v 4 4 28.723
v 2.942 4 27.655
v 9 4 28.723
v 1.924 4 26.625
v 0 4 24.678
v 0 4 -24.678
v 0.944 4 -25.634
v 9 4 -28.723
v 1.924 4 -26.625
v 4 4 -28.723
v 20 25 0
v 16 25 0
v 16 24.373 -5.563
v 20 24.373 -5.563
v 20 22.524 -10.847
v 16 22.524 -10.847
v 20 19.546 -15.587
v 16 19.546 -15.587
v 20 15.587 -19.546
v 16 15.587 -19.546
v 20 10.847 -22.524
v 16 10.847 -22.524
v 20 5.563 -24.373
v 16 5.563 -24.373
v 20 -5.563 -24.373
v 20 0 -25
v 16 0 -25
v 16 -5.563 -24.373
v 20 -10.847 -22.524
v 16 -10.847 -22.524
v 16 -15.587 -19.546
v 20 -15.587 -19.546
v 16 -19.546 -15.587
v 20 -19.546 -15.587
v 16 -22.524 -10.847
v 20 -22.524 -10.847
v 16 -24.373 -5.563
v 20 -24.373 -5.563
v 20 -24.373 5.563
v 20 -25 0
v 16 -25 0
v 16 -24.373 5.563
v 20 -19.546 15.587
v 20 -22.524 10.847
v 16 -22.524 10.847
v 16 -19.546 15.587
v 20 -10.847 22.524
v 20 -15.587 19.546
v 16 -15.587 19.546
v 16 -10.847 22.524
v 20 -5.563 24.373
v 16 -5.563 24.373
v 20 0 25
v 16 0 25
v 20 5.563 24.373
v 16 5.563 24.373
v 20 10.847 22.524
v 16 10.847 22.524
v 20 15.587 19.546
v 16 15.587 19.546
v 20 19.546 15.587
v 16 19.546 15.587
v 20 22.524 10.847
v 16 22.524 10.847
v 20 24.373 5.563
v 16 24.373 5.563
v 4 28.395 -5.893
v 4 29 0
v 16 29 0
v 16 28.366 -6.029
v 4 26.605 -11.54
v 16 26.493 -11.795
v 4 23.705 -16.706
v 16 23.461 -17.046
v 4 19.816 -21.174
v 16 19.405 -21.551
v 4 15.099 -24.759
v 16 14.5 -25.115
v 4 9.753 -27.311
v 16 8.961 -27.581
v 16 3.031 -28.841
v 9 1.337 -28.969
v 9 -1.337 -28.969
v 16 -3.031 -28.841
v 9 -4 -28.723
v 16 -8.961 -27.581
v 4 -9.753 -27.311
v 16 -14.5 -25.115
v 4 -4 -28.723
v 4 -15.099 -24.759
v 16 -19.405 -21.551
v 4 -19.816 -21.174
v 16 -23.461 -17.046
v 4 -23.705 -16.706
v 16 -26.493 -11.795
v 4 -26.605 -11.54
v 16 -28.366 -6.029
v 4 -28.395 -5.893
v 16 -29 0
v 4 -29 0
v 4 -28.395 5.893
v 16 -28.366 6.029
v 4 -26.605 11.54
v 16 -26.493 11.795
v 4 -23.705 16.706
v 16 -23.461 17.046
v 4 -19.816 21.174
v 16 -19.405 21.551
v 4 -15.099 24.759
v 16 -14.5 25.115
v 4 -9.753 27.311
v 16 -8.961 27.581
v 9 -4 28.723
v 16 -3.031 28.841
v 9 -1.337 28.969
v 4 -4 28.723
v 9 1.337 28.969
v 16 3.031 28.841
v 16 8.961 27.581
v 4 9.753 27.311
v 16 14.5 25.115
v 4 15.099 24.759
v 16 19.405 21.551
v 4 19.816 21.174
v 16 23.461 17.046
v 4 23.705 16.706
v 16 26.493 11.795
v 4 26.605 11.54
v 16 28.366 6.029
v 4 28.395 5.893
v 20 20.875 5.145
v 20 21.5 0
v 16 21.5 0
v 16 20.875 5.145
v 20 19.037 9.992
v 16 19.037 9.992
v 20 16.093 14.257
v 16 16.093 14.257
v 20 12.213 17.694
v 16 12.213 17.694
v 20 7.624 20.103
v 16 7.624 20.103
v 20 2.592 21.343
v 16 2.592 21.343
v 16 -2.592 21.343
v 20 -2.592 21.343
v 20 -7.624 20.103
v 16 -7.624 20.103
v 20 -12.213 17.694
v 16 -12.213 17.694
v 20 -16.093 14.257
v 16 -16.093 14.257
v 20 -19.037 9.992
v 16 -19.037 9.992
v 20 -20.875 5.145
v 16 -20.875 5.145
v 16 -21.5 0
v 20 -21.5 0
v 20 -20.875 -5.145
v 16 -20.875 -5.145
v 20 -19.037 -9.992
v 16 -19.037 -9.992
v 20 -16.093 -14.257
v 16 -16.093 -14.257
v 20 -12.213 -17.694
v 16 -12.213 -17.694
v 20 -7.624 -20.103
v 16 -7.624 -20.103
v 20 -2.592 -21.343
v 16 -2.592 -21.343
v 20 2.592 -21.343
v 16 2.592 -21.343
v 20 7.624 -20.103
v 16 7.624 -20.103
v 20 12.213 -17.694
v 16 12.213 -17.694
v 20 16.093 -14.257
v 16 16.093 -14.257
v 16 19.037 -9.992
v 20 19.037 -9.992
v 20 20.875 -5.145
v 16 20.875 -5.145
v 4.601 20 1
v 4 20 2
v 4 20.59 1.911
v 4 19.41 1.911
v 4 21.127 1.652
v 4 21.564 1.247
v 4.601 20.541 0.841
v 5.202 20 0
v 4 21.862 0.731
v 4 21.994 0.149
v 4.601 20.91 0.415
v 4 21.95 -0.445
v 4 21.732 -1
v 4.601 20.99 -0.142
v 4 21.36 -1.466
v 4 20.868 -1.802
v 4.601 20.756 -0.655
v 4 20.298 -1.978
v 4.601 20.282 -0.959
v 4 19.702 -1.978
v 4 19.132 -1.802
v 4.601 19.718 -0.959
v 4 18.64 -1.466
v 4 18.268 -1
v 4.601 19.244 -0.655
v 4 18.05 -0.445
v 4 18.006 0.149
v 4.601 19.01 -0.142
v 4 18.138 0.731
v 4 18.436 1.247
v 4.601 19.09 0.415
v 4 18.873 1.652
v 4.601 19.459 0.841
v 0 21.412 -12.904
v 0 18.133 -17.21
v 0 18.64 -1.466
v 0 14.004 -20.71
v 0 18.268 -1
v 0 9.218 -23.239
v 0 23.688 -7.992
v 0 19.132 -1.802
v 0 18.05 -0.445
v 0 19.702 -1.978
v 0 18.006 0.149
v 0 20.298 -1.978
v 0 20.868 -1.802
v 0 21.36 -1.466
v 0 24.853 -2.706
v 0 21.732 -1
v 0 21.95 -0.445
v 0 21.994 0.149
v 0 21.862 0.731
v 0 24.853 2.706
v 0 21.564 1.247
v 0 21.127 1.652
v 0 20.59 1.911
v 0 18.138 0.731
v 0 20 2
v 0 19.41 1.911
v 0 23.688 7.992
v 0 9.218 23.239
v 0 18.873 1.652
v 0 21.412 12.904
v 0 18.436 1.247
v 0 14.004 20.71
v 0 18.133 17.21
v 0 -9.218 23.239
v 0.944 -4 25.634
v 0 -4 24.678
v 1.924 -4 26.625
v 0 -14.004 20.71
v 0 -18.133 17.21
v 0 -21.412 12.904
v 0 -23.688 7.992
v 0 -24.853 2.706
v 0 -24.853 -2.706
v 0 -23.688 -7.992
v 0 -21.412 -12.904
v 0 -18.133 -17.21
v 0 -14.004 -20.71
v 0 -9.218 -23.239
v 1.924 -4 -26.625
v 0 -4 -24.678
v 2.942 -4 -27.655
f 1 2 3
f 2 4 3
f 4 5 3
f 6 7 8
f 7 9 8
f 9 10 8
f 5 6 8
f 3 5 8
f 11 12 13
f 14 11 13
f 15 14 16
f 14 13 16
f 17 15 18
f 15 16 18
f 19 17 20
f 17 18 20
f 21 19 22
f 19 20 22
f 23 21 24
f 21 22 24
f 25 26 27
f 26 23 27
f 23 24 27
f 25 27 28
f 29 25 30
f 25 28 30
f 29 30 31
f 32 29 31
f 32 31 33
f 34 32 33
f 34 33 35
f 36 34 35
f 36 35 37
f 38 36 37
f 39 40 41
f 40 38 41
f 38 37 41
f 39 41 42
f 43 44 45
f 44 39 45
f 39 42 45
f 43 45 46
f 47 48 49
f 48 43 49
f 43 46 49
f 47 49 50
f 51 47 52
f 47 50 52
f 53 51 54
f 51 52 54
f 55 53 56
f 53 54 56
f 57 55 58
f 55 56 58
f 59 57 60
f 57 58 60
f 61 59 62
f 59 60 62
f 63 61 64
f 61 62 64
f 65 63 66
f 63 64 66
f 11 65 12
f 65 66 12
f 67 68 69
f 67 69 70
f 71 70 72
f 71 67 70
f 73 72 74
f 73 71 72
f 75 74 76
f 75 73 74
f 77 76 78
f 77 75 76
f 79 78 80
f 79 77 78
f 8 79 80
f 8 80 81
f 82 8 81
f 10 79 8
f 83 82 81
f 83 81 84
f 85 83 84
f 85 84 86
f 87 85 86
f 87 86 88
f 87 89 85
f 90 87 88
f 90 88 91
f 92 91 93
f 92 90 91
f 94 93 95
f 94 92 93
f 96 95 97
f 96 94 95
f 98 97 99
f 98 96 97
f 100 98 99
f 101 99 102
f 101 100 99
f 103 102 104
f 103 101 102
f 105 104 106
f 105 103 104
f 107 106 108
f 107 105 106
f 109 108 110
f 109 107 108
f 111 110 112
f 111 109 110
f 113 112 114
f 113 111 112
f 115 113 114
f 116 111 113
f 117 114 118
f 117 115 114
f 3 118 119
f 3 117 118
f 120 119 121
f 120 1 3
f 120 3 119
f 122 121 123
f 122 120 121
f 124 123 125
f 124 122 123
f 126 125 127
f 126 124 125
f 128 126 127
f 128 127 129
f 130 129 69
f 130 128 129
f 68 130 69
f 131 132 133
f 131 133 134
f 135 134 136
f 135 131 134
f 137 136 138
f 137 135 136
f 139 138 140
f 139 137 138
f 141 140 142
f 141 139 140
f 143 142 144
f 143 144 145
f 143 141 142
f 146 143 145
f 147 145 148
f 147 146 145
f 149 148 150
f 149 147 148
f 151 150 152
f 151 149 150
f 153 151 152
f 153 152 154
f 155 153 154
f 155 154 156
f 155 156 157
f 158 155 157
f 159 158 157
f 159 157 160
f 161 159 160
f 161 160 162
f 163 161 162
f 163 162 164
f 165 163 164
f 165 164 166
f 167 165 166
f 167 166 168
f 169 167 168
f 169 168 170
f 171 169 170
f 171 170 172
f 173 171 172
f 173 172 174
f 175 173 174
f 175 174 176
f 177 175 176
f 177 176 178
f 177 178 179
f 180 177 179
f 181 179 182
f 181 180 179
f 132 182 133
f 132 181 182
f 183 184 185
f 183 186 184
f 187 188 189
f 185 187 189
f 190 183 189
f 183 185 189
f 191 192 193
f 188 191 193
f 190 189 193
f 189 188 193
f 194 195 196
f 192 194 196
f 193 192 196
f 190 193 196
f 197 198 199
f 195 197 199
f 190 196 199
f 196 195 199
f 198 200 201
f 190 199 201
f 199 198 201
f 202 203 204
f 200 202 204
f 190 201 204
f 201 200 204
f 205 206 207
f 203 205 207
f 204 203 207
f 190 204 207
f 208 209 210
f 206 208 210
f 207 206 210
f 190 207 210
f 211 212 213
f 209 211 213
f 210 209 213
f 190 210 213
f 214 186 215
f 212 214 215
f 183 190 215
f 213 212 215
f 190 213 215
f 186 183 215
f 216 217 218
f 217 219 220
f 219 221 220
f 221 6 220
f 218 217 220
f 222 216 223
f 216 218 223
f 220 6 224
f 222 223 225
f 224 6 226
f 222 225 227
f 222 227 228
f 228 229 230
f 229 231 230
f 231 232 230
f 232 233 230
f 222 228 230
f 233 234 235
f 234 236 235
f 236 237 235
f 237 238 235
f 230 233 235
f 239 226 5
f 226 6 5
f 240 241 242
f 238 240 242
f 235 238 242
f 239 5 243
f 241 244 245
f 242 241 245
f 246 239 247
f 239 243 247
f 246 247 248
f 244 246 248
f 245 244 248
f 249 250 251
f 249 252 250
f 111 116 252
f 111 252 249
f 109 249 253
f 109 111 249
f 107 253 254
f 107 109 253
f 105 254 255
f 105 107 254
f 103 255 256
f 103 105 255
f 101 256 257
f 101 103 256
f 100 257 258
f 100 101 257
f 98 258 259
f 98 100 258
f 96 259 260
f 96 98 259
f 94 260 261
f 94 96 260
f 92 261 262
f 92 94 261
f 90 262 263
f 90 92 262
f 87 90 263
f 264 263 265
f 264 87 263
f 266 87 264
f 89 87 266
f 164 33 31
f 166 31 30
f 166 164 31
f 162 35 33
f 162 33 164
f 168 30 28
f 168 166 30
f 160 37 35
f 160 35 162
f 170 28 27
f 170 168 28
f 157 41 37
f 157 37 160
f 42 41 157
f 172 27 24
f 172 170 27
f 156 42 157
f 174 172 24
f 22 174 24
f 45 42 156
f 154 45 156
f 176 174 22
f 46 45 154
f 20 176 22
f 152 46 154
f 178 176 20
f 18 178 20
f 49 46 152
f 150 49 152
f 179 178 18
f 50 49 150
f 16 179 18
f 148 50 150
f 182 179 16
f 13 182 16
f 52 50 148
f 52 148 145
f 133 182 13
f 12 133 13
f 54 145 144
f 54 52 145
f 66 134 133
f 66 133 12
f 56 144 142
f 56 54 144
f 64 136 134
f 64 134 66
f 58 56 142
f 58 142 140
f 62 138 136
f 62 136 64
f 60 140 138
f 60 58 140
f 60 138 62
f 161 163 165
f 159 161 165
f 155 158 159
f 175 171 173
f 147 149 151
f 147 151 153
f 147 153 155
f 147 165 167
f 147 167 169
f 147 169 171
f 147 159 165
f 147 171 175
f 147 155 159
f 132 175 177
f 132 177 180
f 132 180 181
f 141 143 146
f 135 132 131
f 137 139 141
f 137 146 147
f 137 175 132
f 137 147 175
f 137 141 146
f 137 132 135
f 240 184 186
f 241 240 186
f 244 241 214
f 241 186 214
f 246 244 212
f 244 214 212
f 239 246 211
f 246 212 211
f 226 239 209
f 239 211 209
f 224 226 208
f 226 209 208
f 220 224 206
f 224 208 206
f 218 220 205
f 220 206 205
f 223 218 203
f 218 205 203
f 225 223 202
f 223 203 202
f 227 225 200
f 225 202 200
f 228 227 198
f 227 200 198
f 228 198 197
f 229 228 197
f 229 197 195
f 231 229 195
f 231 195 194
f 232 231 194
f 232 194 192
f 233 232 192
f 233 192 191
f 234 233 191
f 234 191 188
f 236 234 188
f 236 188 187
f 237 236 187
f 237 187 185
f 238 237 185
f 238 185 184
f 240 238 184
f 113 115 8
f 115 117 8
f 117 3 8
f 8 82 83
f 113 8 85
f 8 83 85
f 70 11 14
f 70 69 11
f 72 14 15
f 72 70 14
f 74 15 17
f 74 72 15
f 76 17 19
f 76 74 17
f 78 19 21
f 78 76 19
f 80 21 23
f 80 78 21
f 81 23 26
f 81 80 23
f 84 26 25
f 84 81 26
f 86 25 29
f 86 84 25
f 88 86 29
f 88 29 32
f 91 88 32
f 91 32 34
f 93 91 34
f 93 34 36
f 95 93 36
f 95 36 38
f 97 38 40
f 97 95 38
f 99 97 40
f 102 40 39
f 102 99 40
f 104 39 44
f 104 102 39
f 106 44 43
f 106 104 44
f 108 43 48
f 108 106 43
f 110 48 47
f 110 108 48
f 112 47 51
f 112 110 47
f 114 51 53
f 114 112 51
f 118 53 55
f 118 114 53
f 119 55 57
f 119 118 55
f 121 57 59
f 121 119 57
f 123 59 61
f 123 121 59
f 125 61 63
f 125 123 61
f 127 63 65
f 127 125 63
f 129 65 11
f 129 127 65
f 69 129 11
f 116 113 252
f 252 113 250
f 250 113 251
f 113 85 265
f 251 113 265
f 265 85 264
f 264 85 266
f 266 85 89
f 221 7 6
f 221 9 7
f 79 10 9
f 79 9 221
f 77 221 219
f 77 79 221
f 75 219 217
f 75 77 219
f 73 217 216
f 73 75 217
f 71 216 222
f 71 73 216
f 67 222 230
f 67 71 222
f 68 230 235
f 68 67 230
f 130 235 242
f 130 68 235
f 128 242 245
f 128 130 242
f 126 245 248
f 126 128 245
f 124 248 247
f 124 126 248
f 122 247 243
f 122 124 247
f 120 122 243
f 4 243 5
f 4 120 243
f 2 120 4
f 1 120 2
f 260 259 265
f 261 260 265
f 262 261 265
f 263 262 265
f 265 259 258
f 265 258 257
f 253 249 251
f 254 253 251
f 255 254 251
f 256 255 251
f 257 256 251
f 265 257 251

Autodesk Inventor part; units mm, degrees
ref_plane "YZ Plane" through (0, 0, 0) normal (1, 0, 0) x (0, 1, 0)
ref_plane "XZ Plane" through (0, 0, 0) normal (0, 1, 0) x (-1, 0, 0)
ref_plane "XY Plane" through (0, 0, 0) normal (0, 0, 1) x (1, 0, 0)
sketch "Эскиз5" plane through (0, 0, 0) normal (0, 0, 1) x (1, 0, 0)
  line L0 (0, 0) -> (20, 0)
  line L1 (20, 0) -> (20, 25)
  line L2 (16, 29) -> (4, 29)
  line L3 (0, 25) -> (0, 0)
  line L4 (4, 29) -> (0, 25)
  line L5 (16, 29) -> (20, 25)
  point P0 (20, 29)
  point P1 (0, 29)
  dimension "d23" = 20
  dimension "d24" = 29
  dimension "d25" = 4
  dimension "d26" = 4
  dimension "d27" = 4
  dimension "d28" = 4
revolve "Вращение3" add sketch "Эскиз5" angle 360 about axis through (0, 0, 0) along (1, 0, 0)
sketch "Эскиз6" plane through (0, 0, 0) normal (0, 0, 1) x (1, 0, 0)
  line L0 (0, -25) -> (0, 25) construction
  line L1 (0, 4) -> (9, 4)
  line L2 (9, 4) -> (9, -4)
  line L3 (9, -4) -> (0, -4)
  line L4 (0, -4) -> (0, 4)
  point P0 (0, 0)
  point P1 (0, 0)
  point P2 (0, 0)
  dimension "d30" = 9
  dimension "d31" = 8
extrude "Выдавливание2" cut sketch "Эскиз6" along normal through all both and the other way through all
sketch "Эскиз7" plane through (0, 0, 0) normal (-1, 0, 0) x (0, 0, 1)
  line L0 (0, 0) -> (0, 20) construction
  dimension "d34" = 20
hole "Отверстие2" at (0, 20, 0) direction (1, 0, 0) diameter 4 depth 4 tip angle 118
sketch "Эскиз8" plane through (0, 0, 0) normal (0, 0, 1) x (1, 0, 0)
  line L0 (20, -25) -> (20, 25) construction
  line L1 (20, 25) -> (16, 25)
  line L2 (16, 25) -> (16, 21.5)
  line L3 (16, 21.5) -> (20, 21.5)
  line L4 (20, 21.5) -> (20, 25)
  line L5 (0, 0) -> (20, 0)
  dimension "d42" = 4
  dimension "d43" = 3.5
revolve "Вращение4" cut sketch "Эскиз8" angle 360 about axis through (0, 0, 0) along (1, 0, 0)
equation "\"d26\" = d25"
equation "\"d27\" = d25"
equation "\"d28\" = d27"
properties part number "711118"
